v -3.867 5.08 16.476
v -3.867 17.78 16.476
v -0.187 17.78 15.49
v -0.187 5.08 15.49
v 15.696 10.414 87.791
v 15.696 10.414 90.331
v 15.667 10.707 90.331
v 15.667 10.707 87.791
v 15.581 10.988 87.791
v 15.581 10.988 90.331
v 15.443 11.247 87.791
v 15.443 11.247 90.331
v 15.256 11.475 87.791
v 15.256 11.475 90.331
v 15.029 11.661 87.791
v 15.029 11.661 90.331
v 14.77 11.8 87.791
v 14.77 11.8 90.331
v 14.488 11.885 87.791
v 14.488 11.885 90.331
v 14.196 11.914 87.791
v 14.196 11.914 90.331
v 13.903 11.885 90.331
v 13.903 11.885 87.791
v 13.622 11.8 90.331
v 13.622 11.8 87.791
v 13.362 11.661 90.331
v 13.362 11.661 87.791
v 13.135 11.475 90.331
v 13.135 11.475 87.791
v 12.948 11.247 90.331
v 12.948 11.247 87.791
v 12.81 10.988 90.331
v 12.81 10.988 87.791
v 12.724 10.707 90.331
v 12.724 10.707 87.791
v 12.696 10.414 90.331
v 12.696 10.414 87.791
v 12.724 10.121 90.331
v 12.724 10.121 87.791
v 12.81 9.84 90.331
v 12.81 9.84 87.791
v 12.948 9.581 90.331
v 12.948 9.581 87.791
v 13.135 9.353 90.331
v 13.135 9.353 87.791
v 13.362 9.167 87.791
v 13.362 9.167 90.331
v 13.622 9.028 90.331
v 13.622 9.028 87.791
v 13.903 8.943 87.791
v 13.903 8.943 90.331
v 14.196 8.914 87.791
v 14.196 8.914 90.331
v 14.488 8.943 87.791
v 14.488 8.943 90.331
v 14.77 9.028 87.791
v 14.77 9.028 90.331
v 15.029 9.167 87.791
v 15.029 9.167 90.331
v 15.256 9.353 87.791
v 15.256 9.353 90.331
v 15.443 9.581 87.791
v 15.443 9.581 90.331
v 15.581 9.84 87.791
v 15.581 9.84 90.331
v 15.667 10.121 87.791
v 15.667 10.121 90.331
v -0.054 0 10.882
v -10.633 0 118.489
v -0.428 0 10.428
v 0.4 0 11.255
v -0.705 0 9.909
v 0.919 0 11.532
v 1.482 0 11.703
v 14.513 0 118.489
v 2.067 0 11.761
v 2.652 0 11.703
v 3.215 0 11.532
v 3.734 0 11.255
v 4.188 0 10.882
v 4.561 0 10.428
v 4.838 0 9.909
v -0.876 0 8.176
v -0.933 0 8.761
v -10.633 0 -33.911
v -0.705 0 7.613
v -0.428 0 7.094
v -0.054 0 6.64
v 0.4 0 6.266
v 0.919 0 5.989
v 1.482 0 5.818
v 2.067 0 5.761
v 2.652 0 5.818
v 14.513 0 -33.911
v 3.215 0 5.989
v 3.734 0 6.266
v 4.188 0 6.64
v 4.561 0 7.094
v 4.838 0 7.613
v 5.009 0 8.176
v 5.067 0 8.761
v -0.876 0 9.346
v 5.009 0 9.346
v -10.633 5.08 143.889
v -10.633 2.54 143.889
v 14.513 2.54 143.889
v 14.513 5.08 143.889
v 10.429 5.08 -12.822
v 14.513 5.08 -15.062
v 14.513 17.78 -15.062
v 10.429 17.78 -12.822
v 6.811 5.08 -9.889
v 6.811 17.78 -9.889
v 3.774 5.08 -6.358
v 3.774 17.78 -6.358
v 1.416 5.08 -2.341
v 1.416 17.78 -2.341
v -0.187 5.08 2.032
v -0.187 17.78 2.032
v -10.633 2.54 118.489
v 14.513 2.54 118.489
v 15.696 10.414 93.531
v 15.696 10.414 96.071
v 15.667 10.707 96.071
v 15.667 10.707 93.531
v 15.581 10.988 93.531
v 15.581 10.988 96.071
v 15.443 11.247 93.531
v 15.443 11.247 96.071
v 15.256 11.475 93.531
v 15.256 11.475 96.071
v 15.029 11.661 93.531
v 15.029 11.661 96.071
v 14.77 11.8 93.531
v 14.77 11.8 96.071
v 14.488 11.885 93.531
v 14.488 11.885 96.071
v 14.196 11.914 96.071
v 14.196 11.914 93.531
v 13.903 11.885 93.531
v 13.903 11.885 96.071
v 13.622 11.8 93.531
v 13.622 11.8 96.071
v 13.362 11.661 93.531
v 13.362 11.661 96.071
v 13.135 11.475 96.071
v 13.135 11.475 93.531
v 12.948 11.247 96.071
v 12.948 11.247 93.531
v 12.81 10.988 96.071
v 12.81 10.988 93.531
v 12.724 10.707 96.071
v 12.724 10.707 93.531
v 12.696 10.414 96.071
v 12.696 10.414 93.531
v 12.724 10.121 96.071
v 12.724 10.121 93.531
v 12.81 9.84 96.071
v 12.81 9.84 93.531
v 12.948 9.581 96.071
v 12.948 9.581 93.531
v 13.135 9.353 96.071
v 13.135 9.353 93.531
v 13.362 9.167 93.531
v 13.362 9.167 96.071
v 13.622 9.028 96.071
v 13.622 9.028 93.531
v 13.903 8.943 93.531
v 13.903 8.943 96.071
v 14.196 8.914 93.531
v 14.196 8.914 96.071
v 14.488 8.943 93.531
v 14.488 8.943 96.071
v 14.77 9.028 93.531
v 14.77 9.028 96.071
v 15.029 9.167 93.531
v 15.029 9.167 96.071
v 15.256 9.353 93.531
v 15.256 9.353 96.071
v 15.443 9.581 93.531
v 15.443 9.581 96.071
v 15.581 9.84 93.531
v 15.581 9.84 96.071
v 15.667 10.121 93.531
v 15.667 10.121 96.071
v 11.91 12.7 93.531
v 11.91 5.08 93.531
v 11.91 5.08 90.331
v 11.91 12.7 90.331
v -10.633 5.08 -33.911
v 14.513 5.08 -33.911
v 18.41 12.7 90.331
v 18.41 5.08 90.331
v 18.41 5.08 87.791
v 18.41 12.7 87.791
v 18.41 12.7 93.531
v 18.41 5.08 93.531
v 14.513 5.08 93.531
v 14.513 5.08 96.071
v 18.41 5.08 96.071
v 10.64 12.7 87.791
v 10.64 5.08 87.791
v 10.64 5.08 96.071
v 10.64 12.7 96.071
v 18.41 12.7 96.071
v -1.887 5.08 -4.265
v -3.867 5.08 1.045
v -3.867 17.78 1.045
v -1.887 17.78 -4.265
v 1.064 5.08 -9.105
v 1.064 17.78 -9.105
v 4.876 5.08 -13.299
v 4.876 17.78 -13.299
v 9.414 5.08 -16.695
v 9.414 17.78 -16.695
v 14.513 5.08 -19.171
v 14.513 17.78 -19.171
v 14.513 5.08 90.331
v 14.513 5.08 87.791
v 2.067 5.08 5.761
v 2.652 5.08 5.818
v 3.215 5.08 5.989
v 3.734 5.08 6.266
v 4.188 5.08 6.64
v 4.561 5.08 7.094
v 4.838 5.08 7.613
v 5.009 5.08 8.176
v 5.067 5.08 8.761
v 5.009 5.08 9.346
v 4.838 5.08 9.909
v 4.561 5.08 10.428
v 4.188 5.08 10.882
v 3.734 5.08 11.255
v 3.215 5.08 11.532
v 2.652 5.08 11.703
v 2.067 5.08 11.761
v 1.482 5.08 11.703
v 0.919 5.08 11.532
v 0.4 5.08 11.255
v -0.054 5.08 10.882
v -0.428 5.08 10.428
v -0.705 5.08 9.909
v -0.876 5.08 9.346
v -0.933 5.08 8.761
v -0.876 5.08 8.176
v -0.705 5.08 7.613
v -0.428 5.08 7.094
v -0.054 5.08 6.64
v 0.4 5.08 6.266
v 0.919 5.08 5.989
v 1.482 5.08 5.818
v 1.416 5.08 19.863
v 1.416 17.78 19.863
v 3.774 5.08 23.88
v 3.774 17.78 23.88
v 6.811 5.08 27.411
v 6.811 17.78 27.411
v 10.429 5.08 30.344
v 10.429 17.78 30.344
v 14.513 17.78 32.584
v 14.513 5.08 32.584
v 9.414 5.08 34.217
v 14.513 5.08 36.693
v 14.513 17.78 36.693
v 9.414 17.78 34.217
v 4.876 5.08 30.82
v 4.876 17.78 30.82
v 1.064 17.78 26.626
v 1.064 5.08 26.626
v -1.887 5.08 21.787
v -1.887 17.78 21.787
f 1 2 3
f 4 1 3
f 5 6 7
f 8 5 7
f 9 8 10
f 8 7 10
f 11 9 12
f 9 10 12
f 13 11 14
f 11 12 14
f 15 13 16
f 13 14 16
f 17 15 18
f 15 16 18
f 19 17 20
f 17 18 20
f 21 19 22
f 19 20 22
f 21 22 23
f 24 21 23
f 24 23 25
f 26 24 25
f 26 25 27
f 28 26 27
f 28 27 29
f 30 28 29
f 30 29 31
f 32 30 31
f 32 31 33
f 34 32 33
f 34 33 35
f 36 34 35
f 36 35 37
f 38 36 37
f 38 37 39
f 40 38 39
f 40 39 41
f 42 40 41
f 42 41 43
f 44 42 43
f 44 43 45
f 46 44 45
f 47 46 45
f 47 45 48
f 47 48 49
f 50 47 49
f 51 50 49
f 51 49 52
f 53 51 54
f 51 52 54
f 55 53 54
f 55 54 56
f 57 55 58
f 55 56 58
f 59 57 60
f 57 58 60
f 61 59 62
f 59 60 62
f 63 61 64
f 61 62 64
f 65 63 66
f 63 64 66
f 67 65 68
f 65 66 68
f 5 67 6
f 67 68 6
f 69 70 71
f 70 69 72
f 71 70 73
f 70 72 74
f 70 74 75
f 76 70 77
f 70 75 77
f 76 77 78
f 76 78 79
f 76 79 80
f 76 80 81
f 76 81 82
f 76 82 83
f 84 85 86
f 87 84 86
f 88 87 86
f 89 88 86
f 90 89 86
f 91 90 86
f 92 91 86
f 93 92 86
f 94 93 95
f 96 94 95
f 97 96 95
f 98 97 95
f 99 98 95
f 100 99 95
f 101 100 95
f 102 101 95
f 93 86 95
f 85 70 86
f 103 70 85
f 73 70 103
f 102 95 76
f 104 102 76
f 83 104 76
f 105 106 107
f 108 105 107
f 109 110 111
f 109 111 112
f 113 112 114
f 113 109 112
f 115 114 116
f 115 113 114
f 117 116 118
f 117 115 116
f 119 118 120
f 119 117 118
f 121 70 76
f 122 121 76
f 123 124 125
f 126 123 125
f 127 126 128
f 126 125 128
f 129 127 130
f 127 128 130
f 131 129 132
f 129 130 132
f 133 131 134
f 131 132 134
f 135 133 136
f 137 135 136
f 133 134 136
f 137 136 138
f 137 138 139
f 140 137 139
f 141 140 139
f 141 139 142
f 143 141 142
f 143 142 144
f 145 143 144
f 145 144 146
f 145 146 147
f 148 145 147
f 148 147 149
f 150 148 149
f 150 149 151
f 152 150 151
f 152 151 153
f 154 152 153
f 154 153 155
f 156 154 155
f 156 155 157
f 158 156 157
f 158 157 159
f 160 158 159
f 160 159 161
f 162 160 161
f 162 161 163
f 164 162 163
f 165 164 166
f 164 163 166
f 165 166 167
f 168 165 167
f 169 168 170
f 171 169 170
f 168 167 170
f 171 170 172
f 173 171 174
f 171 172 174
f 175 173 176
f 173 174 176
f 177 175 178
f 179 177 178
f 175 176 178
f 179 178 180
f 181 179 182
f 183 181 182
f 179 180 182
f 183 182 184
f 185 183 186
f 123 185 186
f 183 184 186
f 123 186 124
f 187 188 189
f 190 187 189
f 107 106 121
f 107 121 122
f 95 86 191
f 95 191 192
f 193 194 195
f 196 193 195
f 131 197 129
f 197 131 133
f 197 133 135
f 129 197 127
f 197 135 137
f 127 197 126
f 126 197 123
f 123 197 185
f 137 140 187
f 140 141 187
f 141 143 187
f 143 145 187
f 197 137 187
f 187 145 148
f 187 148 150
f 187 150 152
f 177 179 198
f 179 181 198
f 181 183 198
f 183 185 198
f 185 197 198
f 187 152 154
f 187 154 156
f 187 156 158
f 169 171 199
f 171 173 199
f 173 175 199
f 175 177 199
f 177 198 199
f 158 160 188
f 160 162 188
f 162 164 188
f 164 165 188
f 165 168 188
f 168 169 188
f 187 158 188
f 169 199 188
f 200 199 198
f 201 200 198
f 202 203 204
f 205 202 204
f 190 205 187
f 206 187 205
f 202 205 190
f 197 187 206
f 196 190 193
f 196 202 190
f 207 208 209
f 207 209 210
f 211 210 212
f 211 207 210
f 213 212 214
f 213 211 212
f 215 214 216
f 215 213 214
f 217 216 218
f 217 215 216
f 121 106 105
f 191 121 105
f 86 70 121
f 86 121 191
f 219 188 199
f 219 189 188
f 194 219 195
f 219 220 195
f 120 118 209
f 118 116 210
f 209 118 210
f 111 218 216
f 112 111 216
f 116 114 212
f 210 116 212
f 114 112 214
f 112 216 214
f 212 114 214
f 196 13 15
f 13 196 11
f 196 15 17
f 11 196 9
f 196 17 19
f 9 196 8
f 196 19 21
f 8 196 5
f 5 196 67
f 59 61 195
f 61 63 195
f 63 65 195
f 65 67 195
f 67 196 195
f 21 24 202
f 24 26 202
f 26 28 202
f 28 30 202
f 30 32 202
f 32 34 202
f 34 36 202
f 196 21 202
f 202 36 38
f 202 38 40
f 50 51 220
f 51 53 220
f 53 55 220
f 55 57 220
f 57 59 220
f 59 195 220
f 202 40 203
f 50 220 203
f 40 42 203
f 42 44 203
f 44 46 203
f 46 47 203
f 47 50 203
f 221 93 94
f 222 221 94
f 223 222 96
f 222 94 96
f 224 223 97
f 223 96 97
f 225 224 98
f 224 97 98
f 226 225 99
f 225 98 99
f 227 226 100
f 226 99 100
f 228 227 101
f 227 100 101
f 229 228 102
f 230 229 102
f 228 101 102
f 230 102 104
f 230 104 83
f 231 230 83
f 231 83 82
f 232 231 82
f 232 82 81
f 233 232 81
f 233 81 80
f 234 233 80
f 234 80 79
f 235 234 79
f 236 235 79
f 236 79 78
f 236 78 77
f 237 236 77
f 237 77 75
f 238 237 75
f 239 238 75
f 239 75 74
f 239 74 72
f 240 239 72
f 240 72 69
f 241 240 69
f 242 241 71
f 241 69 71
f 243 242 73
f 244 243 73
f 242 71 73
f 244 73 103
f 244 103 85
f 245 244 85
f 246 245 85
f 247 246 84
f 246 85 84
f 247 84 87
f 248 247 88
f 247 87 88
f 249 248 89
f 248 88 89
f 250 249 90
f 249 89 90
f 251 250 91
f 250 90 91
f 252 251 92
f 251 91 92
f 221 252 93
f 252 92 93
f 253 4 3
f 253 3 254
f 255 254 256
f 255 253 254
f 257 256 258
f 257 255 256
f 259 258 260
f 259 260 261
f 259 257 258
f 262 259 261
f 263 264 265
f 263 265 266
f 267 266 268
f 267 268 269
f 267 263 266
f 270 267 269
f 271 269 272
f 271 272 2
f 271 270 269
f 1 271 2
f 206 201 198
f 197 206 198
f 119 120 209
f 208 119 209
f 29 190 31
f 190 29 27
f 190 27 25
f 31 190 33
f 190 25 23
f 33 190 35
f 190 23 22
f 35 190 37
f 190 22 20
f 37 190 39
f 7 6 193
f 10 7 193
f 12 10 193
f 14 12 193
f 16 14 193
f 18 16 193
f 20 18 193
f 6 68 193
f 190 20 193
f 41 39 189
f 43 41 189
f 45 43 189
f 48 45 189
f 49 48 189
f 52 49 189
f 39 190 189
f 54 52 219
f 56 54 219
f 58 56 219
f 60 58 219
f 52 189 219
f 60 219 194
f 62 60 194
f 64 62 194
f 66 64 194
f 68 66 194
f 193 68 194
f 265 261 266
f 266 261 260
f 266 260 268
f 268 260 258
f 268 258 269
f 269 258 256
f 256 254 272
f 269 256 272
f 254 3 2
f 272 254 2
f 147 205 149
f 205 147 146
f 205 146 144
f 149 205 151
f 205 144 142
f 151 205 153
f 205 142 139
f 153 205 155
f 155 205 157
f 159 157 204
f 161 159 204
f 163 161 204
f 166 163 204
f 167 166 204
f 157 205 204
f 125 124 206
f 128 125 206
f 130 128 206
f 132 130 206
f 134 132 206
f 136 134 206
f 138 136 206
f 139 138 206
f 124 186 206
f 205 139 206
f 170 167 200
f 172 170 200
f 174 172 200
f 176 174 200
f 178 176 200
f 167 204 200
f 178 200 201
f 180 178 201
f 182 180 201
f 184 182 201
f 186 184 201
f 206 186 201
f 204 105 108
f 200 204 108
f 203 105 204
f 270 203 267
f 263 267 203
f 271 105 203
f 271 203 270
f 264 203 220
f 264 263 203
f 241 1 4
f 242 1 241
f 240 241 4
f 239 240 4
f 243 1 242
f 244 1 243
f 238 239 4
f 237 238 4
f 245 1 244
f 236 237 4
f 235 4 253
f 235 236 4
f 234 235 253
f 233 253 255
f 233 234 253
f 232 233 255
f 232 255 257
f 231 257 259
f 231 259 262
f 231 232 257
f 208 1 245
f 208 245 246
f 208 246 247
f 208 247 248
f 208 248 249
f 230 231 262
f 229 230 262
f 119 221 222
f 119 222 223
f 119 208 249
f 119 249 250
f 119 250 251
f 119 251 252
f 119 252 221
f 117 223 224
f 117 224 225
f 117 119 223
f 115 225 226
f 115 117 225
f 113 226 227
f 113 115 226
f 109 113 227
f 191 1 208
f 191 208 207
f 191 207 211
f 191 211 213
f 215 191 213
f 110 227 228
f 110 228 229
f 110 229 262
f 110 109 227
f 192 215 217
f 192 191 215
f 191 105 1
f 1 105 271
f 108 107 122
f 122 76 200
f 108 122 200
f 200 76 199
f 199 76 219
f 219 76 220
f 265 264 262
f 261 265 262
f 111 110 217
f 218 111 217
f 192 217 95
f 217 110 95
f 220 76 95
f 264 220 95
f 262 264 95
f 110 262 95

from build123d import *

# Parameters (mm, degrees)
SKETCH2_W           = 25.146
SKETCH2_H           = 177.8
BOSS_EXTRUDE1_DEPTH = 5.08
SKETCH4_W           = 25.146
SKETCH4_H           = 25.4
CUT_EXTRUDE2_DEPTH  = 2.54
BOSS_EXTRUDE2_DEPTH = 12.7
SKETCH6_R           = 3
CUT_EXTRUDE3_DEPTH  = 146.707735218
BOSS_EXTRUDE3_DEPTH = 7.62
SKETCH9_R           = 1.5
CUT_EXTRUDE4_DEPTH  = 10.668


with BuildPart() as part:
    # Sketch2 → Boss-Extrude1 (new body)
    with BuildSketch(Plane(origin=(0, 0, 0), x_dir=(1, 0, 0), z_dir=(0, 1, 0))):
        with Locations((1.939834286, -54.988822857)):
            Rectangle(SKETCH2_W, SKETCH2_H)
    extrude(amount=BOSS_EXTRUDE1_DEPTH)

    # Sketch4 → Cut-Extrude2 (cut)
    with BuildSketch(Plane.XZ):
        with Locations((1.939834286, 131.188822857)):
            Rectangle(SKETCH4_W, SKETCH4_H)
    extrude(amount=-CUT_EXTRUDE2_DEPTH, mode=Mode.SUBTRACT)

    # Sketch5 → Boss-Extrude2 (add)
    with BuildSketch(Plane(origin=(0, 5.08, 0), x_dir=(1, 0, 0), z_dir=(0, 1, 0))):
        with BuildLine():
            Line((14.512834286, 19.170963767), (14.512834286, 15.062455759))
            ThreePointArc((14.512834286, 15.062455759), (5.213589162, 8.191698096), (-0.187237198, -2.031527684))
            Line((-0.187237198, -2.031527684), (-3.867414596, -1.045427123))
            ThreePointArc((-3.867414596, -1.045427123), (2.870150259, 11.292575602), (14.512834286, 19.170963767))
        make_face()
        with BuildLine():
            Line((14.512834286, -32.584101473), (14.512834286, -36.692609481))
            ThreePointArc((14.512834286, -36.692609481), (2.870150259, -28.814221316), (-3.867414596, -16.476218592))
            Line((-3.867414596, -16.476218592), (-0.187237198, -15.49011803))
            ThreePointArc((-0.187237198, -15.49011803), (5.213589162, -25.713343811), (14.512834286, -32.584101473))
        make_face()
    extrude(amount=BOSS_EXTRUDE2_DEPTH)

    # Sketch6 → Cut-Extrude3 (cut, through all)
    with BuildSketch(Plane.XZ):
        with Locations(Location((2.066834286, 8.760822857, 0), (0, 0, 270))):
            Circle(SKETCH6_R)
    extrude(amount=-CUT_EXTRUDE3_DEPTH, mode=Mode.SUBTRACT)

    # Sketch8 → Boss-Extrude3 (add)
    with BuildSketch(Plane(origin=(0, 5.08, 0), x_dir=(1, 0, 0), z_dir=(0, 1, 0))):
        Polygon((18.409653056, -90.331413744), (18.409653056, -87.791413744), (10.639653056, -87.791413744), (10.639653056, -96.071413744), (18.409653056, -96.071413744), (18.409653056, -93.531413744), (11.909653056, -93.531413744), (11.909653056, -90.331413744), align=None)
    extrude(amount=BOSS_EXTRUDE3_DEPTH)

    # Sketch9 → Cut-Extrude4 (cut)
    with BuildSketch(Plane.XY.offset(96.071413744)):
        with Locations((14.195653056, 10.414)):
            Circle(SKETCH9_R)
    extrude(amount=-CUT_EXTRUDE4_DEPTH, mode=Mode.SUBTRACT)


solid = part.part
